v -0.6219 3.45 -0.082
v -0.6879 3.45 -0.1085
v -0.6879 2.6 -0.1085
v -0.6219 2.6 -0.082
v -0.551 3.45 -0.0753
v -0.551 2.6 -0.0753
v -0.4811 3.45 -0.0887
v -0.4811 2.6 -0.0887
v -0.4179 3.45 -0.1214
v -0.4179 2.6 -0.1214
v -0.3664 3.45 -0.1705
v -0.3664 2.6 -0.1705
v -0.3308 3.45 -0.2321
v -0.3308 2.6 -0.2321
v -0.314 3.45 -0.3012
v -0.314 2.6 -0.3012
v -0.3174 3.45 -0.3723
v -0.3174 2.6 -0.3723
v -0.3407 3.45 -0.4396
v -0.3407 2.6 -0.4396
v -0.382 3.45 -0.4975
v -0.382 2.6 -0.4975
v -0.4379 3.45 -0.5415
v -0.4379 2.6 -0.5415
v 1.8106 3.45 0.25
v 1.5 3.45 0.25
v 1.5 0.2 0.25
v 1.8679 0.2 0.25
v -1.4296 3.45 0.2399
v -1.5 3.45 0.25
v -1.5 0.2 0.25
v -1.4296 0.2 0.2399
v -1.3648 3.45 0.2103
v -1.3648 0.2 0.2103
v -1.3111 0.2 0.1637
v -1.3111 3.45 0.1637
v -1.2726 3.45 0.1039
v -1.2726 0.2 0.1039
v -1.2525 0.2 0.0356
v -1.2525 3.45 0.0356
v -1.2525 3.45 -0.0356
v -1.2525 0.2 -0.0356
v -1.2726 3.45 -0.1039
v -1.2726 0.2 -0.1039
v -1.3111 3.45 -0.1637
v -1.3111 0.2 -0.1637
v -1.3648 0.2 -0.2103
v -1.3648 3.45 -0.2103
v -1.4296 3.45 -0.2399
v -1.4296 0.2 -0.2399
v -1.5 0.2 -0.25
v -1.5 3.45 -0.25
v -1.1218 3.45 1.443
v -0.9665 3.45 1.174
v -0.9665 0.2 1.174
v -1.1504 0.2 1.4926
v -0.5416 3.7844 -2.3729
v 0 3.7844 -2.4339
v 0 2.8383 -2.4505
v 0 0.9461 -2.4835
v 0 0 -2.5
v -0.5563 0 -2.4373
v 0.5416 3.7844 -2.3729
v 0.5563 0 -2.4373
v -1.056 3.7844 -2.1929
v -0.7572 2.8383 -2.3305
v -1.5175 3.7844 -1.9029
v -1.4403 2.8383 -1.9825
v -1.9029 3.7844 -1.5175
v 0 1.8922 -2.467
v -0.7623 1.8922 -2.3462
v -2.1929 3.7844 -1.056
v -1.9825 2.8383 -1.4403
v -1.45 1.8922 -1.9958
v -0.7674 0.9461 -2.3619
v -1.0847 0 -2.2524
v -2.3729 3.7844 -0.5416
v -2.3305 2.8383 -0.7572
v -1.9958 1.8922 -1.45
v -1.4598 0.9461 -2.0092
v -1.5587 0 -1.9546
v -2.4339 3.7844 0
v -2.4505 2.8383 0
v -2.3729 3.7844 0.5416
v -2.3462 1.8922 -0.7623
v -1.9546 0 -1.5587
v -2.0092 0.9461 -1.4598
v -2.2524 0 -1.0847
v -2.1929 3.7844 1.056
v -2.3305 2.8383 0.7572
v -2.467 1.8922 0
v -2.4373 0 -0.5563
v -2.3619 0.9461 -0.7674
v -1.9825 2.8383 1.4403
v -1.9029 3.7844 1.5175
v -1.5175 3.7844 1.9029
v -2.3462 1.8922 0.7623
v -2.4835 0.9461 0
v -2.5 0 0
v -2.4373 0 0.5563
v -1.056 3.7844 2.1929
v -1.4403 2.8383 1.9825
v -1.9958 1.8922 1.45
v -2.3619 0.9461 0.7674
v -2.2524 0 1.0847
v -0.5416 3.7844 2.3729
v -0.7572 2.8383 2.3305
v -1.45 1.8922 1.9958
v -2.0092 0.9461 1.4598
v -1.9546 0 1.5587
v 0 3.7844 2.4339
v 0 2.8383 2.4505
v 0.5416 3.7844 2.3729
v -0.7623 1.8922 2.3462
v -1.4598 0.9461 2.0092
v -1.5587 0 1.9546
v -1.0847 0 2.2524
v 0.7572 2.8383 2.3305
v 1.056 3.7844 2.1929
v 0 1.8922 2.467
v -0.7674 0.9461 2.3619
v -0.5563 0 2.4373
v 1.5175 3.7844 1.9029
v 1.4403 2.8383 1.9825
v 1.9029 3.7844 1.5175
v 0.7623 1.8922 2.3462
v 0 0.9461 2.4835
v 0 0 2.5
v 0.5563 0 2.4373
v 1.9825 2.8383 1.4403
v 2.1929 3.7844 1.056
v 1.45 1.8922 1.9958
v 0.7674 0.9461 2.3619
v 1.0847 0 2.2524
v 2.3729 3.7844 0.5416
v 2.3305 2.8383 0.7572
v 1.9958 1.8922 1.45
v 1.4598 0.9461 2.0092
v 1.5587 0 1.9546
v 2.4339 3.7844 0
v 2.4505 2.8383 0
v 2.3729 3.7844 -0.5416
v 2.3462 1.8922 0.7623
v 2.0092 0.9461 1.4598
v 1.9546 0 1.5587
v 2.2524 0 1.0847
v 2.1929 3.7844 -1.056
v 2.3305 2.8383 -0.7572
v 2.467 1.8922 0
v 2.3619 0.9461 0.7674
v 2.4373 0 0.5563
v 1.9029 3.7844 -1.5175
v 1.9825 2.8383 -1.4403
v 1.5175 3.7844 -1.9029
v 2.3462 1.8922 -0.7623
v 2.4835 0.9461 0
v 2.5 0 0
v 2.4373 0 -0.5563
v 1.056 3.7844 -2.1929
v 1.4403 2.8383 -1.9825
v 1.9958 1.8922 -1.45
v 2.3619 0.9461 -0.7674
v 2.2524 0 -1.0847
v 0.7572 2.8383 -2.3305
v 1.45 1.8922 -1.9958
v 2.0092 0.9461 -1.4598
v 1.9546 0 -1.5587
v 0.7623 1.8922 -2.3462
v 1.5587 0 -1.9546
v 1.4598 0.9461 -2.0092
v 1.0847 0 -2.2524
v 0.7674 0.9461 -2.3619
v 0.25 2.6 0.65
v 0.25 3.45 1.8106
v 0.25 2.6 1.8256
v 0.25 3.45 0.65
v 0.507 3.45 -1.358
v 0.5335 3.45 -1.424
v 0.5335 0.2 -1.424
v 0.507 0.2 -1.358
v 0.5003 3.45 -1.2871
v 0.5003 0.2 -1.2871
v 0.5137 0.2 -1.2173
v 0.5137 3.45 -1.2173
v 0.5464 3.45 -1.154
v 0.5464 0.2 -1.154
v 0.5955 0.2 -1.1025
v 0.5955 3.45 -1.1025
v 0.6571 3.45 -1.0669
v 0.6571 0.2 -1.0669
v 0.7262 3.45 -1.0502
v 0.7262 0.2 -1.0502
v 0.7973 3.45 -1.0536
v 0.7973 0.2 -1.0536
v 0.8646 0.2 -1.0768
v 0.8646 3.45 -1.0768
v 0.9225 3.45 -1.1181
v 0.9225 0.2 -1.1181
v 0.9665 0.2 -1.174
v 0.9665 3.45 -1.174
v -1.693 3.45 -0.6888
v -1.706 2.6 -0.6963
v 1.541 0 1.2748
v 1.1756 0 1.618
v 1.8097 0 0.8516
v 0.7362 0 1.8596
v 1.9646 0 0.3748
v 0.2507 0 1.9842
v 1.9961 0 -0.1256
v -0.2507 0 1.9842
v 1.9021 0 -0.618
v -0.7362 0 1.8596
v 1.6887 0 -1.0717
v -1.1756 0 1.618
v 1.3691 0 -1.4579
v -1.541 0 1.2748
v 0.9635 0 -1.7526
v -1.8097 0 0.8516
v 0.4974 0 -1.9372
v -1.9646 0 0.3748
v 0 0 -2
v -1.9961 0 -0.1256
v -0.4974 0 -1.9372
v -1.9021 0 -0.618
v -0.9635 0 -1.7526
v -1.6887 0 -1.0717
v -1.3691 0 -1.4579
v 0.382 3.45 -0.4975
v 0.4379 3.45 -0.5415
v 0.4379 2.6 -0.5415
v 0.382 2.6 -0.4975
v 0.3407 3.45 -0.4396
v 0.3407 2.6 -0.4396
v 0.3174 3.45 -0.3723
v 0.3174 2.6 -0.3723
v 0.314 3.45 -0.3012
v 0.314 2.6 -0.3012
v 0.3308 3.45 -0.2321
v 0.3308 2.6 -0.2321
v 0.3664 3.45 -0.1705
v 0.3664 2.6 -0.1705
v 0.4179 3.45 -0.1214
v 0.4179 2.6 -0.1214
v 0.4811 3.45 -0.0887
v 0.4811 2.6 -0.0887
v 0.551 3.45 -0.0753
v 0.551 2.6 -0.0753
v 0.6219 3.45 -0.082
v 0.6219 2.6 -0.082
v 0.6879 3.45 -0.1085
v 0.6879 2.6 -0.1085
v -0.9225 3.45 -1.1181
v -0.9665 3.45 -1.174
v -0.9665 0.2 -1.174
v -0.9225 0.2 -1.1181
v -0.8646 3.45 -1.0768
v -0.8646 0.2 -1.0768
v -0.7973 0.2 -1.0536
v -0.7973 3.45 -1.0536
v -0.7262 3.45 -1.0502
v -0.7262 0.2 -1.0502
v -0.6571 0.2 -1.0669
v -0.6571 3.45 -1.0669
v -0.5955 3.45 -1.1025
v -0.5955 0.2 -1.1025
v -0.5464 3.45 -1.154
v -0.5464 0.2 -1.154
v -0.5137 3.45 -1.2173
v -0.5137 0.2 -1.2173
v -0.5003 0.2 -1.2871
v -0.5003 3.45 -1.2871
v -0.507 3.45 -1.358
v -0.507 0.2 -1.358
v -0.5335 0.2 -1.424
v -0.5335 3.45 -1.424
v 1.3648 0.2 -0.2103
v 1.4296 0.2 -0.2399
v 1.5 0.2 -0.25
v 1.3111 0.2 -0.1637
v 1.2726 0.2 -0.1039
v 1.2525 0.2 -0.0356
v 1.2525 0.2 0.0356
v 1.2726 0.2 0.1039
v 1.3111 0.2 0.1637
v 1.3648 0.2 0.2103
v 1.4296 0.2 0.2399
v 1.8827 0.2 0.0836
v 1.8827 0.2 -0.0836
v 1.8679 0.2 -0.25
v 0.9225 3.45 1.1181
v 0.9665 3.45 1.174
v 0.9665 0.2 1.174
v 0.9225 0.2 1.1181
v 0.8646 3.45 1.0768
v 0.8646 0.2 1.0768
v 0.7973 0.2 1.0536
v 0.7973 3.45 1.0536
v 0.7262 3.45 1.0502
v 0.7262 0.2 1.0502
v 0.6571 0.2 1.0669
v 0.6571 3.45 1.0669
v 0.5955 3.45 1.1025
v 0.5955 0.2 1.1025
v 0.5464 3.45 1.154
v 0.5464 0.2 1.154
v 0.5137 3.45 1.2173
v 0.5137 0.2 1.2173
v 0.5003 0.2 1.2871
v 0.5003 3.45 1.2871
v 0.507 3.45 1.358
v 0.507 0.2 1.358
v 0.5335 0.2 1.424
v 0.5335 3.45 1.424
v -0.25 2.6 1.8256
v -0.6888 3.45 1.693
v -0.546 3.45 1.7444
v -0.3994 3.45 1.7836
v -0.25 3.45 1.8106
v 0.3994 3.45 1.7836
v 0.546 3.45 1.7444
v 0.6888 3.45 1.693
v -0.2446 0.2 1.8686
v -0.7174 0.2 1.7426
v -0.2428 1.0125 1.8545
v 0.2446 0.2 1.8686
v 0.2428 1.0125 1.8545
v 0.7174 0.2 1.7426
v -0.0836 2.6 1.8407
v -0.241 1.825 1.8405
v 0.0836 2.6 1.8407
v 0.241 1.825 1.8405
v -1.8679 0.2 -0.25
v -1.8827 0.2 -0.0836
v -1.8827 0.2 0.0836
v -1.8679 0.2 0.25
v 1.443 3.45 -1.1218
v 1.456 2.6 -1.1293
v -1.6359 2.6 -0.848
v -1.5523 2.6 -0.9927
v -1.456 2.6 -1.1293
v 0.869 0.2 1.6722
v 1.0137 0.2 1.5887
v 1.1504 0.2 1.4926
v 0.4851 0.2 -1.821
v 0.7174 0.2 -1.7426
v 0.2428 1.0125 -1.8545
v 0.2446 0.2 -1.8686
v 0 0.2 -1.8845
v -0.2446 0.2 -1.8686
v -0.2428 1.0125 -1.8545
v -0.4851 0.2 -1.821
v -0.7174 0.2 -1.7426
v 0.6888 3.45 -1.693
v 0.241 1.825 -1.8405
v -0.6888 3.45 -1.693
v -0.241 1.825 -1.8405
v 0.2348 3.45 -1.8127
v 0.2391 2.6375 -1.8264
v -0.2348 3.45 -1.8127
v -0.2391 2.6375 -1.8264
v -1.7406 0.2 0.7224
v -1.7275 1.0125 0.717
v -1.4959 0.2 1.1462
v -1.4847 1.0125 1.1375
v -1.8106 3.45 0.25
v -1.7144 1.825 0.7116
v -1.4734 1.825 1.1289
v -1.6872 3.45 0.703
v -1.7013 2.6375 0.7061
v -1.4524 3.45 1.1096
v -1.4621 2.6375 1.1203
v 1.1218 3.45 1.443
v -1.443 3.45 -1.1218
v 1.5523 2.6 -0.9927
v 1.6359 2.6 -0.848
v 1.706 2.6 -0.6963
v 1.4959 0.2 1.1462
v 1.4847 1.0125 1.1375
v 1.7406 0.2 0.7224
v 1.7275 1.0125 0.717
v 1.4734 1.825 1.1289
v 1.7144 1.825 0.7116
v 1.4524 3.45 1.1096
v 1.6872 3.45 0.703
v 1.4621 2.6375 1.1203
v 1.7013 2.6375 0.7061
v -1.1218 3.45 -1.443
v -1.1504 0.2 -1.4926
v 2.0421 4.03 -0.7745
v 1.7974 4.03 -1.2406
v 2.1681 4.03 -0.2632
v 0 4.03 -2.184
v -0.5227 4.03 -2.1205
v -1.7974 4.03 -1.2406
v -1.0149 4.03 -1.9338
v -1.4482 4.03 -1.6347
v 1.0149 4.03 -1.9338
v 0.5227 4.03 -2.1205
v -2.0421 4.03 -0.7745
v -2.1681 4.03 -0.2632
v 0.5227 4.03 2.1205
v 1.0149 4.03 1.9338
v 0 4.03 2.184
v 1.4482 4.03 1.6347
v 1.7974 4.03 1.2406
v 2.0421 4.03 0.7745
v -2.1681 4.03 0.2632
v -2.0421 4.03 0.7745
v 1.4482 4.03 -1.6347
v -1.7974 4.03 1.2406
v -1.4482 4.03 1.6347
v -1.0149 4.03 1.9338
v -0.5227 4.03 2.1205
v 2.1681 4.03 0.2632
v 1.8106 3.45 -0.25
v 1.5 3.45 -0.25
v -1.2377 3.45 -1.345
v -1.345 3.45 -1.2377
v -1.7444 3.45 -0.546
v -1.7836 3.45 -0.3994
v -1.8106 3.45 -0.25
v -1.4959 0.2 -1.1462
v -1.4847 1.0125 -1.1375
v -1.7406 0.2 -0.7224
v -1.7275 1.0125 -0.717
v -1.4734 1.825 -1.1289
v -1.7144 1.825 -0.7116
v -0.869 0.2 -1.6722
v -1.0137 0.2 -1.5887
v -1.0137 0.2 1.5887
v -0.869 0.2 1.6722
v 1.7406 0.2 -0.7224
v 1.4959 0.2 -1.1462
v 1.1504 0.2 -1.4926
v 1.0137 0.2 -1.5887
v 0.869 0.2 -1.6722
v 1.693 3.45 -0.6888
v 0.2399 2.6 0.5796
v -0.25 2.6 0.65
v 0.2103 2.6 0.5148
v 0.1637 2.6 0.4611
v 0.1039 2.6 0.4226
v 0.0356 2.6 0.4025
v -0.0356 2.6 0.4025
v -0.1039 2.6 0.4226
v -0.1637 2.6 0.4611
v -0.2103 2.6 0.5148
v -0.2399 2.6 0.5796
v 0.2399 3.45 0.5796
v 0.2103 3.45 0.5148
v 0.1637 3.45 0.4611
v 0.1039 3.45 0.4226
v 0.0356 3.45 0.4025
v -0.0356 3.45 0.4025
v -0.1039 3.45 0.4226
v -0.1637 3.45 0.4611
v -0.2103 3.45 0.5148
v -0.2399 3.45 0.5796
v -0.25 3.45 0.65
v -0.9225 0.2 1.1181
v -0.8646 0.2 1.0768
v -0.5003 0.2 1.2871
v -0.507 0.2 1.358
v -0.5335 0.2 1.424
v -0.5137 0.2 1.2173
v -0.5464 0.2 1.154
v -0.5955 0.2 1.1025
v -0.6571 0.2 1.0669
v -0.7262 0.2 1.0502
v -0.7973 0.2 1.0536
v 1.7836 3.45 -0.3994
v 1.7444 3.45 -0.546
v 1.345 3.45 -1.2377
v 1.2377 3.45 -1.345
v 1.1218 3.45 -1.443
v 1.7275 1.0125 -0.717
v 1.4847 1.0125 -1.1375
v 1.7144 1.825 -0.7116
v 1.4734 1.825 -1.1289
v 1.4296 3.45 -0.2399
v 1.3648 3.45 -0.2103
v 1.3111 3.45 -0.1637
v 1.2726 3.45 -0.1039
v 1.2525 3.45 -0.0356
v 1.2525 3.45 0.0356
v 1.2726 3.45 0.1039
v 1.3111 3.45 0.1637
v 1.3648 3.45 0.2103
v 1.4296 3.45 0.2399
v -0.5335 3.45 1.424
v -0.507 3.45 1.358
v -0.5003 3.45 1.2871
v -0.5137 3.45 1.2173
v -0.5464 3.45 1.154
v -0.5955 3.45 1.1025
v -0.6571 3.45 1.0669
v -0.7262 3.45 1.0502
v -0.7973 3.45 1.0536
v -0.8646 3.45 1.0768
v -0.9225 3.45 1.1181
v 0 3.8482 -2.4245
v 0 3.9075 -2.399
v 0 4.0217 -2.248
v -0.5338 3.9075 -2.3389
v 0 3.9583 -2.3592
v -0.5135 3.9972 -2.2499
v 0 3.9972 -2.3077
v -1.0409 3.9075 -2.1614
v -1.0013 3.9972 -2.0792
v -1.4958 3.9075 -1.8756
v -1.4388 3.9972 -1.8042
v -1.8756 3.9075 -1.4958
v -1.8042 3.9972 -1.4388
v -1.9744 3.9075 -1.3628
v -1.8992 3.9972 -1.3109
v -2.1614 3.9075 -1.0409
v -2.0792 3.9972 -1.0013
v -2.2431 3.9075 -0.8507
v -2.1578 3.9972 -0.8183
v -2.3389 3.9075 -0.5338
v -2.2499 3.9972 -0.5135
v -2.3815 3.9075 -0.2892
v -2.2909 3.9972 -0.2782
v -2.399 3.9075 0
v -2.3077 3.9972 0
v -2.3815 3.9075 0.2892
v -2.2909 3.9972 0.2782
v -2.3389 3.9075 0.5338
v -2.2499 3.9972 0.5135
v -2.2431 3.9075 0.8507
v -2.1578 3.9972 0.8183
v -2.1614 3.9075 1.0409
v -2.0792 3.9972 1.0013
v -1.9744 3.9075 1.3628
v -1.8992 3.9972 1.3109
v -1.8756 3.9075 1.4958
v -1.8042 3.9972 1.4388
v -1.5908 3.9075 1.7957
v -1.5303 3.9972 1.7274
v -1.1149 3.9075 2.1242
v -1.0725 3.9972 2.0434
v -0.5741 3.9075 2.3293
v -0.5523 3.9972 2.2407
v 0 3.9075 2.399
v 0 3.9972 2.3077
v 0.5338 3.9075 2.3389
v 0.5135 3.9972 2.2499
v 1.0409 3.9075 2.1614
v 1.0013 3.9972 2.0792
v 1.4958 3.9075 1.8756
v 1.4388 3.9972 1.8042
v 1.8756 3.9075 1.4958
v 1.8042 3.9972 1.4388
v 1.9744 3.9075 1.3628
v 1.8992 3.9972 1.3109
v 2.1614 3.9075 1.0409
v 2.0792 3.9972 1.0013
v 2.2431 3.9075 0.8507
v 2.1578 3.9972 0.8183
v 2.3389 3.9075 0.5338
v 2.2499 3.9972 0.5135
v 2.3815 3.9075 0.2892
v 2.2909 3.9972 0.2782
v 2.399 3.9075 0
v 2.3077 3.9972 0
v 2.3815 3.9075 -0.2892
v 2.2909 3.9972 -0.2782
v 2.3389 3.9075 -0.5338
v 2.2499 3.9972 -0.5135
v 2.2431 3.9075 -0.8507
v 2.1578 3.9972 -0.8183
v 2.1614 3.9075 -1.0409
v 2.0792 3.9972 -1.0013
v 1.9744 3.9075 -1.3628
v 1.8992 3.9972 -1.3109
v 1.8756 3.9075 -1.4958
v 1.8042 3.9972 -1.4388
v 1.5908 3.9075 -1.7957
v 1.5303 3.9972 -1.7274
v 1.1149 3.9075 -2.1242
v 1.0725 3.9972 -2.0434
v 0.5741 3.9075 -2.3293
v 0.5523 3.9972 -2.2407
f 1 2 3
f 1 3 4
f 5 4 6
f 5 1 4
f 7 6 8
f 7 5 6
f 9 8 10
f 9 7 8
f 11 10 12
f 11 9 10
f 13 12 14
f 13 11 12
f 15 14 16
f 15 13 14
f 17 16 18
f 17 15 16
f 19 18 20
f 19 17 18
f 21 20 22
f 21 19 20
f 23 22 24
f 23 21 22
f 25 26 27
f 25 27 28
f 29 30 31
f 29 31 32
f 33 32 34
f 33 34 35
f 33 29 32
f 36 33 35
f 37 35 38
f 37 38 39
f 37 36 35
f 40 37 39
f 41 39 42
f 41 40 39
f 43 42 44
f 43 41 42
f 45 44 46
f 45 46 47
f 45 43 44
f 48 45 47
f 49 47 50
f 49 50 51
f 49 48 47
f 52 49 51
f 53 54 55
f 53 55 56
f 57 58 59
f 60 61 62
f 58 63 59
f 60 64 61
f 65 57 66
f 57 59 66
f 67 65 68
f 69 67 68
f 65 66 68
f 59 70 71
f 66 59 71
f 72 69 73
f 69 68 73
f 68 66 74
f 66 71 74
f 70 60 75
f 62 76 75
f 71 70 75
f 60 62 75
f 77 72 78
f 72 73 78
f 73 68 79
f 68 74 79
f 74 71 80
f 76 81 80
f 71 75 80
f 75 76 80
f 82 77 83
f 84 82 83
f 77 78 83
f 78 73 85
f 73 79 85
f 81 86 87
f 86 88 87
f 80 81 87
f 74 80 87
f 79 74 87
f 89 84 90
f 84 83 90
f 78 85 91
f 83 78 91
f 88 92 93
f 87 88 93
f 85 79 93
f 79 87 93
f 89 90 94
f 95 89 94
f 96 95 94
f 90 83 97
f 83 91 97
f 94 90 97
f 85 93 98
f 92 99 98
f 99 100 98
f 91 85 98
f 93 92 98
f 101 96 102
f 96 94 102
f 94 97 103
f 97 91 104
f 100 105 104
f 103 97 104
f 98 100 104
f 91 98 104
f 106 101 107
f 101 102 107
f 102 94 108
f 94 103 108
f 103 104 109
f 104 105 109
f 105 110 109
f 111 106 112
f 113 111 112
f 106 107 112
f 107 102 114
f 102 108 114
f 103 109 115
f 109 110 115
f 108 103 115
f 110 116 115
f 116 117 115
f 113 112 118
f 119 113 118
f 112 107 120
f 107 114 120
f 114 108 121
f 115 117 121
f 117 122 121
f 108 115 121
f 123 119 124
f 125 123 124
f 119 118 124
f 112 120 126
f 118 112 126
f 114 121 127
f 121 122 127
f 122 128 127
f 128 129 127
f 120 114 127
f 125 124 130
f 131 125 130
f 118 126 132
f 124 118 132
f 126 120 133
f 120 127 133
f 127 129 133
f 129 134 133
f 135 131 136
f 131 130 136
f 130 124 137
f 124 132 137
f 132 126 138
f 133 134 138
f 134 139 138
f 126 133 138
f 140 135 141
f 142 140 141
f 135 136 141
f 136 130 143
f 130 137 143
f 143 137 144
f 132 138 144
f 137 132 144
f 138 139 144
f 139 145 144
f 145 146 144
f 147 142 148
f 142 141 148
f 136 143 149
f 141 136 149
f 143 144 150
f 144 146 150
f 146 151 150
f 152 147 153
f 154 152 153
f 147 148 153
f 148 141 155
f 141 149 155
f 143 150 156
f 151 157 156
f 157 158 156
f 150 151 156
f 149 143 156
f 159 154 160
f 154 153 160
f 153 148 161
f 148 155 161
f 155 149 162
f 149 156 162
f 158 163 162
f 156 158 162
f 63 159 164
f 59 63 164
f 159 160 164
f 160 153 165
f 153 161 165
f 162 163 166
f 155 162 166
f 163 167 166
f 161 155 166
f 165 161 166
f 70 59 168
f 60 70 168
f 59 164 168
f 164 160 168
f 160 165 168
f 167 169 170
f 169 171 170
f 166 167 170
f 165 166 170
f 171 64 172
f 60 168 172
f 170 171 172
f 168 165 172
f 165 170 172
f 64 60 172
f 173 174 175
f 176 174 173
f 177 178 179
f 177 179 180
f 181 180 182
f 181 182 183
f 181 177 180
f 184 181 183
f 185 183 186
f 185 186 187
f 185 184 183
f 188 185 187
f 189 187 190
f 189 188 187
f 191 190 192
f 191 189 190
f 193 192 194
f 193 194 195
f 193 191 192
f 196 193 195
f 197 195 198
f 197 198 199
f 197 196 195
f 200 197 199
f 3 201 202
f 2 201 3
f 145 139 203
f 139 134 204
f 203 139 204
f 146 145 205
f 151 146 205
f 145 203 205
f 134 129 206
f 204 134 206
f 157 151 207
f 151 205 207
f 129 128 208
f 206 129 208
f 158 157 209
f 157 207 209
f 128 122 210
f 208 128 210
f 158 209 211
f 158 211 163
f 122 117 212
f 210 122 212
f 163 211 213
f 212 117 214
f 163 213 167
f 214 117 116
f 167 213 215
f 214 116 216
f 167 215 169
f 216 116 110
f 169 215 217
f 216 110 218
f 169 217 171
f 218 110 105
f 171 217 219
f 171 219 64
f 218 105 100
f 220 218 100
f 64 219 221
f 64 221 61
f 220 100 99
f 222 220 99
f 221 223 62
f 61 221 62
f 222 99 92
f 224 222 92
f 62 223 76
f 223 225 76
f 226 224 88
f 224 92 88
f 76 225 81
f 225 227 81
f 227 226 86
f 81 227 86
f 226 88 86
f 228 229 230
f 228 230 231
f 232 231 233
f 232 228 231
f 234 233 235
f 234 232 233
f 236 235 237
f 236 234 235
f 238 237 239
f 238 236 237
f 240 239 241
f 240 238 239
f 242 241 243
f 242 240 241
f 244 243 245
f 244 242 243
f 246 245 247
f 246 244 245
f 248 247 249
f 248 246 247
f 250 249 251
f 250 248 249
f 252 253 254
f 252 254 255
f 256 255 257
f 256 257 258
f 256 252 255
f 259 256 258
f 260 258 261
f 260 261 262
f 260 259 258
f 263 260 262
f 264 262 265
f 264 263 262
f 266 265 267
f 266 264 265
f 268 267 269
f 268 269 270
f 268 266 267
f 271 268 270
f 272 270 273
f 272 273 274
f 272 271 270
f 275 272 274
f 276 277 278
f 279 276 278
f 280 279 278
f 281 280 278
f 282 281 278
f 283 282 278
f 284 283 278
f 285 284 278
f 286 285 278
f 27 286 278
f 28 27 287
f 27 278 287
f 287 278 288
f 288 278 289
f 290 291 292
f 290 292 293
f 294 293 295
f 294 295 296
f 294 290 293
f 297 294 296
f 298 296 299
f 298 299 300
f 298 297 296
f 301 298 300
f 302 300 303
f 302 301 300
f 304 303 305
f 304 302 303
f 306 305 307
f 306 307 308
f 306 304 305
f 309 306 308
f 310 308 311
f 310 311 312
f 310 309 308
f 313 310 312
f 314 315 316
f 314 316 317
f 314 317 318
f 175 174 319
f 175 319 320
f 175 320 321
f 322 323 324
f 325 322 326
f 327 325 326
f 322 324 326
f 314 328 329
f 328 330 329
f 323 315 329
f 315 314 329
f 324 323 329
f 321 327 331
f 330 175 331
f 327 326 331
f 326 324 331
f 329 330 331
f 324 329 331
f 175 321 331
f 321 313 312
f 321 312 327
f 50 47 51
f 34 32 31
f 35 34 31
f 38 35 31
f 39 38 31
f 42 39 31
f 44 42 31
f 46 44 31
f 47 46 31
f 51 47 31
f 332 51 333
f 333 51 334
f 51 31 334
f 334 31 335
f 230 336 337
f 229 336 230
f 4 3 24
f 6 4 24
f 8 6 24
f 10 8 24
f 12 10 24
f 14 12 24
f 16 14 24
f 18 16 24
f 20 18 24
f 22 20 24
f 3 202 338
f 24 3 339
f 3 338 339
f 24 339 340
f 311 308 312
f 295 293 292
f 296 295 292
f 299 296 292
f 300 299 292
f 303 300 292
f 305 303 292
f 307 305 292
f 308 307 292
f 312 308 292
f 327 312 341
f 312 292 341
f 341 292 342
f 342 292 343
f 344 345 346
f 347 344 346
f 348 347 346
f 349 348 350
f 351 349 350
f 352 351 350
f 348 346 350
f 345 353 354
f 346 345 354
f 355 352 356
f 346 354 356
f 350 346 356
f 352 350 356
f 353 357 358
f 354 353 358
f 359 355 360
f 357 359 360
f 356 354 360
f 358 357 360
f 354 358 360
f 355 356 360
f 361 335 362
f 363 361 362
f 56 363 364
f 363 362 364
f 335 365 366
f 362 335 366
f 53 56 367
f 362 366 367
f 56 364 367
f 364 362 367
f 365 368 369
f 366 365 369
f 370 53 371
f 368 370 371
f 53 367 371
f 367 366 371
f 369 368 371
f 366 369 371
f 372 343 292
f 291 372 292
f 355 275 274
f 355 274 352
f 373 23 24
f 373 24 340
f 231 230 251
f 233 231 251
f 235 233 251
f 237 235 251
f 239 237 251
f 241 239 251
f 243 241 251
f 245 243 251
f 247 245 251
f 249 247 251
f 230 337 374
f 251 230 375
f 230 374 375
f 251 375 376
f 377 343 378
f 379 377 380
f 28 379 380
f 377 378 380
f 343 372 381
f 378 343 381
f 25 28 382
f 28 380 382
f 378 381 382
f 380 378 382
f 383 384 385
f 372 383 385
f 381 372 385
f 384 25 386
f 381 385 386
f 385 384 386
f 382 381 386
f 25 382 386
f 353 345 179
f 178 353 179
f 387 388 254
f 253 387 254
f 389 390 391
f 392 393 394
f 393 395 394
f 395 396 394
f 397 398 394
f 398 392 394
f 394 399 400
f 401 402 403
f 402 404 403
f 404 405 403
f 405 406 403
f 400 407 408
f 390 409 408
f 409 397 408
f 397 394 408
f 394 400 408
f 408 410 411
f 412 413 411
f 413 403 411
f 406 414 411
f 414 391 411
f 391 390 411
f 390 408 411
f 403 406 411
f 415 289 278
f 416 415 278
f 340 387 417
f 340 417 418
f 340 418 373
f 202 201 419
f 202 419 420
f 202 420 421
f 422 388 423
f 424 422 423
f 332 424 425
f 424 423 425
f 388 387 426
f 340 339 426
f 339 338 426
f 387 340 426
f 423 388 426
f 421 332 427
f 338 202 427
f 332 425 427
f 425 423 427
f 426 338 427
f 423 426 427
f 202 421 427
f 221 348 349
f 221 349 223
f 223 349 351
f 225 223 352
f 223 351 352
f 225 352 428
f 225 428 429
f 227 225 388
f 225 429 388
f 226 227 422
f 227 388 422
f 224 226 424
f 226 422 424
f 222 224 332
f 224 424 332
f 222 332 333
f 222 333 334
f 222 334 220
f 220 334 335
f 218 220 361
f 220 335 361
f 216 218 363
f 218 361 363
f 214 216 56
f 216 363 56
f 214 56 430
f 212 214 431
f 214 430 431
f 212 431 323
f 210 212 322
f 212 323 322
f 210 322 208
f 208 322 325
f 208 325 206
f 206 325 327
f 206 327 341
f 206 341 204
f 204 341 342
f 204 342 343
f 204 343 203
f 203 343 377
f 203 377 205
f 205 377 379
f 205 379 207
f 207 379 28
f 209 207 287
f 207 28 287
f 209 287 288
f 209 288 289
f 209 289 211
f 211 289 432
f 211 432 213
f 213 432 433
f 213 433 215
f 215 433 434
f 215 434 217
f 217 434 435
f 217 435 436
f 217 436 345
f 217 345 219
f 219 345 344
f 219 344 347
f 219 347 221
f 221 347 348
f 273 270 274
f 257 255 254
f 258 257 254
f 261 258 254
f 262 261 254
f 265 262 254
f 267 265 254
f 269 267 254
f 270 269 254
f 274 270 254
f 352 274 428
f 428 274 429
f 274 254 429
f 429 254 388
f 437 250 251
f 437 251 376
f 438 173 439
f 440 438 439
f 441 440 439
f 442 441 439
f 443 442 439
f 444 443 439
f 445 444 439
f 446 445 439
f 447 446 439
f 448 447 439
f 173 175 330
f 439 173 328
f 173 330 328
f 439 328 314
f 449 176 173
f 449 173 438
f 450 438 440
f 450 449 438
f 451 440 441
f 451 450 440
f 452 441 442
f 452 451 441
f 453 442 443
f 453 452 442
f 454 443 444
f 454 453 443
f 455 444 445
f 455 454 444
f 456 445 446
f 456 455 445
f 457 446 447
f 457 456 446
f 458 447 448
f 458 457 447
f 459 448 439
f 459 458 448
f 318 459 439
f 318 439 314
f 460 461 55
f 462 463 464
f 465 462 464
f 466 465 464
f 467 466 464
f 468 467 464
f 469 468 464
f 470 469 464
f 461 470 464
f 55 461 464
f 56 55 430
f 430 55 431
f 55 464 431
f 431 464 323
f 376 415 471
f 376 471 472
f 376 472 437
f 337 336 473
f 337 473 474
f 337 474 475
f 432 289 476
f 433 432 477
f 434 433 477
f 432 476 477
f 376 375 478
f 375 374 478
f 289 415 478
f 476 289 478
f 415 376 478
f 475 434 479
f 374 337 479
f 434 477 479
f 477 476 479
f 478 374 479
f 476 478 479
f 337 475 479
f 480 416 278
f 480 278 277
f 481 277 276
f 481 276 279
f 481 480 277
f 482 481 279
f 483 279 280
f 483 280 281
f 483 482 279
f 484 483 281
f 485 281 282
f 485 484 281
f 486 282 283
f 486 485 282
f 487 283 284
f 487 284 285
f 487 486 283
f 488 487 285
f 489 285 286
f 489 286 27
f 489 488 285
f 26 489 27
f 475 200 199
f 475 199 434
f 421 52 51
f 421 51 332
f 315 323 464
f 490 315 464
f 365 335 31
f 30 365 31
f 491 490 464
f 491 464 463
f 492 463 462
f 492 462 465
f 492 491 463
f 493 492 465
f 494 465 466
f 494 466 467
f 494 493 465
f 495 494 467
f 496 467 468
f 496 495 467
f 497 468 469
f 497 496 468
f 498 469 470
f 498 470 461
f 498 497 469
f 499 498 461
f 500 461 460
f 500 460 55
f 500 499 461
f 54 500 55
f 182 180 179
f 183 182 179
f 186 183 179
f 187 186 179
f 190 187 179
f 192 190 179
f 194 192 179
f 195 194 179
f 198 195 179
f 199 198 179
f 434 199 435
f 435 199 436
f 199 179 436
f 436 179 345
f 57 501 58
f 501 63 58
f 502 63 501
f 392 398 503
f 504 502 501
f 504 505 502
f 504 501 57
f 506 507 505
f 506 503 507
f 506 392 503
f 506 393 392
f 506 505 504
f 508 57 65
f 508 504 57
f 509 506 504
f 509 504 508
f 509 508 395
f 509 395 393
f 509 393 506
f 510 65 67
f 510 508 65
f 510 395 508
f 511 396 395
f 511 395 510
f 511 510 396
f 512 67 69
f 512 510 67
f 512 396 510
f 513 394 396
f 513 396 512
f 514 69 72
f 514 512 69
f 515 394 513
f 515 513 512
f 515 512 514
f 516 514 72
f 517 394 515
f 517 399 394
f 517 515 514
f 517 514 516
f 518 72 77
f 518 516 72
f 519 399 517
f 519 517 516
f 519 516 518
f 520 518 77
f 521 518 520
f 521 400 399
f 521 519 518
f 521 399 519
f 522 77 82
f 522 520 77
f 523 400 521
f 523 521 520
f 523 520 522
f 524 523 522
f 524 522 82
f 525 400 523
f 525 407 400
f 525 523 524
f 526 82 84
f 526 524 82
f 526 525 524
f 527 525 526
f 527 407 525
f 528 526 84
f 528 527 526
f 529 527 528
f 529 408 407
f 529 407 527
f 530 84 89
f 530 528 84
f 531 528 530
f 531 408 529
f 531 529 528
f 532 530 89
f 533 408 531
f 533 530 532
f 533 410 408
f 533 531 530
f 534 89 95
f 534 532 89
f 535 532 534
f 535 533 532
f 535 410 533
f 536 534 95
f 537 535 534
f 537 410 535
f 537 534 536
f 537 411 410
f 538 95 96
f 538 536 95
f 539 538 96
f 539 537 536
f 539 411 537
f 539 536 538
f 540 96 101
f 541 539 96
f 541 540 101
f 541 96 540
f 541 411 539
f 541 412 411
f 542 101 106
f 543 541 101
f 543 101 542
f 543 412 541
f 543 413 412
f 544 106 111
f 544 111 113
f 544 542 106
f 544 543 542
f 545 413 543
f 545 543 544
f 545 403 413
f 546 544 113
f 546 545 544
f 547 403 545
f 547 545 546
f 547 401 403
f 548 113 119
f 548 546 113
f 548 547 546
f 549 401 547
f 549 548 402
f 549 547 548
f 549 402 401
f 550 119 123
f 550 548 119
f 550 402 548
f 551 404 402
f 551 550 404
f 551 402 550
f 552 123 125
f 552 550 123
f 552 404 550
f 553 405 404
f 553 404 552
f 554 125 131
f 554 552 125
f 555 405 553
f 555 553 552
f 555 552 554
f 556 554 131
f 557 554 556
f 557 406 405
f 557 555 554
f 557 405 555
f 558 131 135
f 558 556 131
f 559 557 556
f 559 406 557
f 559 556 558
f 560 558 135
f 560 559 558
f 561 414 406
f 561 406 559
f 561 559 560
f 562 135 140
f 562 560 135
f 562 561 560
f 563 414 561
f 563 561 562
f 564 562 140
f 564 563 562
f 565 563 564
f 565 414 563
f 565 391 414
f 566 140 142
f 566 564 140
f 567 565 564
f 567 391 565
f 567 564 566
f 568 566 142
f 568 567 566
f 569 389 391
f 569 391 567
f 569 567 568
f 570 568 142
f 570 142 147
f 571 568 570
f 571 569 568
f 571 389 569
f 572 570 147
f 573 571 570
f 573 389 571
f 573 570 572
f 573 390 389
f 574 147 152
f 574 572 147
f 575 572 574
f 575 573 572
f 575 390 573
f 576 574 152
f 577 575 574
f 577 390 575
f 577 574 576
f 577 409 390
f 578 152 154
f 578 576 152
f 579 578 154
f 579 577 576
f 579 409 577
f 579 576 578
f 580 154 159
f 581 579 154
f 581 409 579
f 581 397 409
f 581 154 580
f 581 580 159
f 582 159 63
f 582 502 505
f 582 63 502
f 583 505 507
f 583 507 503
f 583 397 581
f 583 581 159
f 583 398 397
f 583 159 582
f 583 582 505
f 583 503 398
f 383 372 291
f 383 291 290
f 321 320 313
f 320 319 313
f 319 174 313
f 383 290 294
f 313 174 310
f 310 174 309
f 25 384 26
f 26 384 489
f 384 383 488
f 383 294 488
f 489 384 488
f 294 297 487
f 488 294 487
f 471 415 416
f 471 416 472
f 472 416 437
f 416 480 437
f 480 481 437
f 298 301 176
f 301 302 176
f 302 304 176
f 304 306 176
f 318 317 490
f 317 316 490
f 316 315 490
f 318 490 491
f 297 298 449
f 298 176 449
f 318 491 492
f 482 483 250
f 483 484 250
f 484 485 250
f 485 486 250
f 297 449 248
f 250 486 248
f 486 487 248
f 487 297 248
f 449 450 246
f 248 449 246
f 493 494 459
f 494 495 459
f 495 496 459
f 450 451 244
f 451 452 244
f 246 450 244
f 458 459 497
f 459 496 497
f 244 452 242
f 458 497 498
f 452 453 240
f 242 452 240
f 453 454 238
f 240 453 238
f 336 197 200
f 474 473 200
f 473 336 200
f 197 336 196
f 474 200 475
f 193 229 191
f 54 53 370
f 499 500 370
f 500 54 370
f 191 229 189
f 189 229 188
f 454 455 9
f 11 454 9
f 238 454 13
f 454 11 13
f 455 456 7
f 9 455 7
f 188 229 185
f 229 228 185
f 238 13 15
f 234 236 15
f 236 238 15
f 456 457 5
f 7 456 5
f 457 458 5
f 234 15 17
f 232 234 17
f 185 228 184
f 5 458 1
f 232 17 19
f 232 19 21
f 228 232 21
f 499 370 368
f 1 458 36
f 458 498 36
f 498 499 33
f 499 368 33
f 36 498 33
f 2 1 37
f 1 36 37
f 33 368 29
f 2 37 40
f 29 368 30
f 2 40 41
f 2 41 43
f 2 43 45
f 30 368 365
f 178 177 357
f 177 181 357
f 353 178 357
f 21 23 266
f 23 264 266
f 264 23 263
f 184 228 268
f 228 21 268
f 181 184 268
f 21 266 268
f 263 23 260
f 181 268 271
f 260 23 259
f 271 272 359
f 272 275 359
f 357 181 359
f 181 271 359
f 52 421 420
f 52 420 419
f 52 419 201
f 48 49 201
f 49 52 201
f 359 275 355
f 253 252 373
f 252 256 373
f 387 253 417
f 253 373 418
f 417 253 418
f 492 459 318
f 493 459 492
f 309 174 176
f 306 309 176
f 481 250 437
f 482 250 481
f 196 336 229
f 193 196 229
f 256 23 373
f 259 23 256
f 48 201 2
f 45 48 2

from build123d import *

# Parameters (mm, degrees)
BOSS_EXTRUDE1_DEPTH = 3.25
CIRPATTERN1_COUNT   = 6
BOSS_EXTRUDE2_DEPTH = 0.85
CIRPATTERN2_COUNT   = 3
FILLET1_R           = 0.25


with BuildPart() as part:
    # Sketch1 → Revolve1 (revolve)
    with BuildSketch(Plane.XY, mode=Mode.PRIVATE) as revolve1_sk:
        Polygon((-1.827800985, 3.45), (0, 3.45), (0, 4.03), (-2.429656088, 4.03), (-2.5, 0), (-2, 0), (-1.884529946, 0.2), align=None)
    revolve(revolve1_sk.sketch.rotate(Axis((0, 0, 0), (0, 1, 0)), 270), axis=Axis((0, 0, 0), (0, 1, 0)))

    # Sketch2 → Boss-Extrude1 (add)
    with BuildSketch(Plane.XZ.offset(-3.45)):
        with BuildLine():
            Line((-2, 0.25), (-1.5, 0.25))
            ThreePointArc((-1.5, 0.25), (-1.25, 0), (-1.5, -0.25))
            Line((-1.5, -0.25), (-2, -0.25))
            ThreePointArc((-2, -0.25), (-2.25, 0), (-2, 0.25))
        make_face()
    boss_extrude1 = extrude(amount=BOSS_EXTRUDE1_DEPTH)

    # CirPattern1: Boss-Extrude1 ×6 about axis
    cirpattern1_axis = Axis((0, 0, 0), (0, 1, 0))
    for i in range(1, CIRPATTERN1_COUNT):
        add(boss_extrude1.rotate(cirpattern1_axis, i * 360 / CIRPATTERN1_COUNT))

    # Sketch3 → Boss-Extrude2 (add)
    with BuildSketch(Plane.XZ.offset(-3.45)):
        with BuildLine():
            Line((-0.25, 0.65), (-0.25, 2))
            ThreePointArc((-0.25, 2), (0, 2.25), (0.25, 2))
            Line((0.25, 2), (0.25, 0.65))
            ThreePointArc((0.25, 0.65), (0, 0.4), (-0.25, 0.65))
        make_face()
    boss_extrude2 = extrude(amount=BOSS_EXTRUDE2_DEPTH)

    # CirPattern2: Boss-Extrude2 ×3 about axis
    cirpattern2_axis = Axis((0, 0, 0), (0, 1, 0))
    for i in range(1, CIRPATTERN2_COUNT):
        add(boss_extrude2.rotate(cirpattern2_axis, i * 360 / CIRPATTERN2_COUNT))

    # Fillet1
    fillet1_edges = [part.edges().sort_by_distance(p)[0] for p in [
        (0, 4.03, 2.429656088),
    ]]
    fillet(fillet1_edges, radius=FILLET1_R)


solid = part.part
